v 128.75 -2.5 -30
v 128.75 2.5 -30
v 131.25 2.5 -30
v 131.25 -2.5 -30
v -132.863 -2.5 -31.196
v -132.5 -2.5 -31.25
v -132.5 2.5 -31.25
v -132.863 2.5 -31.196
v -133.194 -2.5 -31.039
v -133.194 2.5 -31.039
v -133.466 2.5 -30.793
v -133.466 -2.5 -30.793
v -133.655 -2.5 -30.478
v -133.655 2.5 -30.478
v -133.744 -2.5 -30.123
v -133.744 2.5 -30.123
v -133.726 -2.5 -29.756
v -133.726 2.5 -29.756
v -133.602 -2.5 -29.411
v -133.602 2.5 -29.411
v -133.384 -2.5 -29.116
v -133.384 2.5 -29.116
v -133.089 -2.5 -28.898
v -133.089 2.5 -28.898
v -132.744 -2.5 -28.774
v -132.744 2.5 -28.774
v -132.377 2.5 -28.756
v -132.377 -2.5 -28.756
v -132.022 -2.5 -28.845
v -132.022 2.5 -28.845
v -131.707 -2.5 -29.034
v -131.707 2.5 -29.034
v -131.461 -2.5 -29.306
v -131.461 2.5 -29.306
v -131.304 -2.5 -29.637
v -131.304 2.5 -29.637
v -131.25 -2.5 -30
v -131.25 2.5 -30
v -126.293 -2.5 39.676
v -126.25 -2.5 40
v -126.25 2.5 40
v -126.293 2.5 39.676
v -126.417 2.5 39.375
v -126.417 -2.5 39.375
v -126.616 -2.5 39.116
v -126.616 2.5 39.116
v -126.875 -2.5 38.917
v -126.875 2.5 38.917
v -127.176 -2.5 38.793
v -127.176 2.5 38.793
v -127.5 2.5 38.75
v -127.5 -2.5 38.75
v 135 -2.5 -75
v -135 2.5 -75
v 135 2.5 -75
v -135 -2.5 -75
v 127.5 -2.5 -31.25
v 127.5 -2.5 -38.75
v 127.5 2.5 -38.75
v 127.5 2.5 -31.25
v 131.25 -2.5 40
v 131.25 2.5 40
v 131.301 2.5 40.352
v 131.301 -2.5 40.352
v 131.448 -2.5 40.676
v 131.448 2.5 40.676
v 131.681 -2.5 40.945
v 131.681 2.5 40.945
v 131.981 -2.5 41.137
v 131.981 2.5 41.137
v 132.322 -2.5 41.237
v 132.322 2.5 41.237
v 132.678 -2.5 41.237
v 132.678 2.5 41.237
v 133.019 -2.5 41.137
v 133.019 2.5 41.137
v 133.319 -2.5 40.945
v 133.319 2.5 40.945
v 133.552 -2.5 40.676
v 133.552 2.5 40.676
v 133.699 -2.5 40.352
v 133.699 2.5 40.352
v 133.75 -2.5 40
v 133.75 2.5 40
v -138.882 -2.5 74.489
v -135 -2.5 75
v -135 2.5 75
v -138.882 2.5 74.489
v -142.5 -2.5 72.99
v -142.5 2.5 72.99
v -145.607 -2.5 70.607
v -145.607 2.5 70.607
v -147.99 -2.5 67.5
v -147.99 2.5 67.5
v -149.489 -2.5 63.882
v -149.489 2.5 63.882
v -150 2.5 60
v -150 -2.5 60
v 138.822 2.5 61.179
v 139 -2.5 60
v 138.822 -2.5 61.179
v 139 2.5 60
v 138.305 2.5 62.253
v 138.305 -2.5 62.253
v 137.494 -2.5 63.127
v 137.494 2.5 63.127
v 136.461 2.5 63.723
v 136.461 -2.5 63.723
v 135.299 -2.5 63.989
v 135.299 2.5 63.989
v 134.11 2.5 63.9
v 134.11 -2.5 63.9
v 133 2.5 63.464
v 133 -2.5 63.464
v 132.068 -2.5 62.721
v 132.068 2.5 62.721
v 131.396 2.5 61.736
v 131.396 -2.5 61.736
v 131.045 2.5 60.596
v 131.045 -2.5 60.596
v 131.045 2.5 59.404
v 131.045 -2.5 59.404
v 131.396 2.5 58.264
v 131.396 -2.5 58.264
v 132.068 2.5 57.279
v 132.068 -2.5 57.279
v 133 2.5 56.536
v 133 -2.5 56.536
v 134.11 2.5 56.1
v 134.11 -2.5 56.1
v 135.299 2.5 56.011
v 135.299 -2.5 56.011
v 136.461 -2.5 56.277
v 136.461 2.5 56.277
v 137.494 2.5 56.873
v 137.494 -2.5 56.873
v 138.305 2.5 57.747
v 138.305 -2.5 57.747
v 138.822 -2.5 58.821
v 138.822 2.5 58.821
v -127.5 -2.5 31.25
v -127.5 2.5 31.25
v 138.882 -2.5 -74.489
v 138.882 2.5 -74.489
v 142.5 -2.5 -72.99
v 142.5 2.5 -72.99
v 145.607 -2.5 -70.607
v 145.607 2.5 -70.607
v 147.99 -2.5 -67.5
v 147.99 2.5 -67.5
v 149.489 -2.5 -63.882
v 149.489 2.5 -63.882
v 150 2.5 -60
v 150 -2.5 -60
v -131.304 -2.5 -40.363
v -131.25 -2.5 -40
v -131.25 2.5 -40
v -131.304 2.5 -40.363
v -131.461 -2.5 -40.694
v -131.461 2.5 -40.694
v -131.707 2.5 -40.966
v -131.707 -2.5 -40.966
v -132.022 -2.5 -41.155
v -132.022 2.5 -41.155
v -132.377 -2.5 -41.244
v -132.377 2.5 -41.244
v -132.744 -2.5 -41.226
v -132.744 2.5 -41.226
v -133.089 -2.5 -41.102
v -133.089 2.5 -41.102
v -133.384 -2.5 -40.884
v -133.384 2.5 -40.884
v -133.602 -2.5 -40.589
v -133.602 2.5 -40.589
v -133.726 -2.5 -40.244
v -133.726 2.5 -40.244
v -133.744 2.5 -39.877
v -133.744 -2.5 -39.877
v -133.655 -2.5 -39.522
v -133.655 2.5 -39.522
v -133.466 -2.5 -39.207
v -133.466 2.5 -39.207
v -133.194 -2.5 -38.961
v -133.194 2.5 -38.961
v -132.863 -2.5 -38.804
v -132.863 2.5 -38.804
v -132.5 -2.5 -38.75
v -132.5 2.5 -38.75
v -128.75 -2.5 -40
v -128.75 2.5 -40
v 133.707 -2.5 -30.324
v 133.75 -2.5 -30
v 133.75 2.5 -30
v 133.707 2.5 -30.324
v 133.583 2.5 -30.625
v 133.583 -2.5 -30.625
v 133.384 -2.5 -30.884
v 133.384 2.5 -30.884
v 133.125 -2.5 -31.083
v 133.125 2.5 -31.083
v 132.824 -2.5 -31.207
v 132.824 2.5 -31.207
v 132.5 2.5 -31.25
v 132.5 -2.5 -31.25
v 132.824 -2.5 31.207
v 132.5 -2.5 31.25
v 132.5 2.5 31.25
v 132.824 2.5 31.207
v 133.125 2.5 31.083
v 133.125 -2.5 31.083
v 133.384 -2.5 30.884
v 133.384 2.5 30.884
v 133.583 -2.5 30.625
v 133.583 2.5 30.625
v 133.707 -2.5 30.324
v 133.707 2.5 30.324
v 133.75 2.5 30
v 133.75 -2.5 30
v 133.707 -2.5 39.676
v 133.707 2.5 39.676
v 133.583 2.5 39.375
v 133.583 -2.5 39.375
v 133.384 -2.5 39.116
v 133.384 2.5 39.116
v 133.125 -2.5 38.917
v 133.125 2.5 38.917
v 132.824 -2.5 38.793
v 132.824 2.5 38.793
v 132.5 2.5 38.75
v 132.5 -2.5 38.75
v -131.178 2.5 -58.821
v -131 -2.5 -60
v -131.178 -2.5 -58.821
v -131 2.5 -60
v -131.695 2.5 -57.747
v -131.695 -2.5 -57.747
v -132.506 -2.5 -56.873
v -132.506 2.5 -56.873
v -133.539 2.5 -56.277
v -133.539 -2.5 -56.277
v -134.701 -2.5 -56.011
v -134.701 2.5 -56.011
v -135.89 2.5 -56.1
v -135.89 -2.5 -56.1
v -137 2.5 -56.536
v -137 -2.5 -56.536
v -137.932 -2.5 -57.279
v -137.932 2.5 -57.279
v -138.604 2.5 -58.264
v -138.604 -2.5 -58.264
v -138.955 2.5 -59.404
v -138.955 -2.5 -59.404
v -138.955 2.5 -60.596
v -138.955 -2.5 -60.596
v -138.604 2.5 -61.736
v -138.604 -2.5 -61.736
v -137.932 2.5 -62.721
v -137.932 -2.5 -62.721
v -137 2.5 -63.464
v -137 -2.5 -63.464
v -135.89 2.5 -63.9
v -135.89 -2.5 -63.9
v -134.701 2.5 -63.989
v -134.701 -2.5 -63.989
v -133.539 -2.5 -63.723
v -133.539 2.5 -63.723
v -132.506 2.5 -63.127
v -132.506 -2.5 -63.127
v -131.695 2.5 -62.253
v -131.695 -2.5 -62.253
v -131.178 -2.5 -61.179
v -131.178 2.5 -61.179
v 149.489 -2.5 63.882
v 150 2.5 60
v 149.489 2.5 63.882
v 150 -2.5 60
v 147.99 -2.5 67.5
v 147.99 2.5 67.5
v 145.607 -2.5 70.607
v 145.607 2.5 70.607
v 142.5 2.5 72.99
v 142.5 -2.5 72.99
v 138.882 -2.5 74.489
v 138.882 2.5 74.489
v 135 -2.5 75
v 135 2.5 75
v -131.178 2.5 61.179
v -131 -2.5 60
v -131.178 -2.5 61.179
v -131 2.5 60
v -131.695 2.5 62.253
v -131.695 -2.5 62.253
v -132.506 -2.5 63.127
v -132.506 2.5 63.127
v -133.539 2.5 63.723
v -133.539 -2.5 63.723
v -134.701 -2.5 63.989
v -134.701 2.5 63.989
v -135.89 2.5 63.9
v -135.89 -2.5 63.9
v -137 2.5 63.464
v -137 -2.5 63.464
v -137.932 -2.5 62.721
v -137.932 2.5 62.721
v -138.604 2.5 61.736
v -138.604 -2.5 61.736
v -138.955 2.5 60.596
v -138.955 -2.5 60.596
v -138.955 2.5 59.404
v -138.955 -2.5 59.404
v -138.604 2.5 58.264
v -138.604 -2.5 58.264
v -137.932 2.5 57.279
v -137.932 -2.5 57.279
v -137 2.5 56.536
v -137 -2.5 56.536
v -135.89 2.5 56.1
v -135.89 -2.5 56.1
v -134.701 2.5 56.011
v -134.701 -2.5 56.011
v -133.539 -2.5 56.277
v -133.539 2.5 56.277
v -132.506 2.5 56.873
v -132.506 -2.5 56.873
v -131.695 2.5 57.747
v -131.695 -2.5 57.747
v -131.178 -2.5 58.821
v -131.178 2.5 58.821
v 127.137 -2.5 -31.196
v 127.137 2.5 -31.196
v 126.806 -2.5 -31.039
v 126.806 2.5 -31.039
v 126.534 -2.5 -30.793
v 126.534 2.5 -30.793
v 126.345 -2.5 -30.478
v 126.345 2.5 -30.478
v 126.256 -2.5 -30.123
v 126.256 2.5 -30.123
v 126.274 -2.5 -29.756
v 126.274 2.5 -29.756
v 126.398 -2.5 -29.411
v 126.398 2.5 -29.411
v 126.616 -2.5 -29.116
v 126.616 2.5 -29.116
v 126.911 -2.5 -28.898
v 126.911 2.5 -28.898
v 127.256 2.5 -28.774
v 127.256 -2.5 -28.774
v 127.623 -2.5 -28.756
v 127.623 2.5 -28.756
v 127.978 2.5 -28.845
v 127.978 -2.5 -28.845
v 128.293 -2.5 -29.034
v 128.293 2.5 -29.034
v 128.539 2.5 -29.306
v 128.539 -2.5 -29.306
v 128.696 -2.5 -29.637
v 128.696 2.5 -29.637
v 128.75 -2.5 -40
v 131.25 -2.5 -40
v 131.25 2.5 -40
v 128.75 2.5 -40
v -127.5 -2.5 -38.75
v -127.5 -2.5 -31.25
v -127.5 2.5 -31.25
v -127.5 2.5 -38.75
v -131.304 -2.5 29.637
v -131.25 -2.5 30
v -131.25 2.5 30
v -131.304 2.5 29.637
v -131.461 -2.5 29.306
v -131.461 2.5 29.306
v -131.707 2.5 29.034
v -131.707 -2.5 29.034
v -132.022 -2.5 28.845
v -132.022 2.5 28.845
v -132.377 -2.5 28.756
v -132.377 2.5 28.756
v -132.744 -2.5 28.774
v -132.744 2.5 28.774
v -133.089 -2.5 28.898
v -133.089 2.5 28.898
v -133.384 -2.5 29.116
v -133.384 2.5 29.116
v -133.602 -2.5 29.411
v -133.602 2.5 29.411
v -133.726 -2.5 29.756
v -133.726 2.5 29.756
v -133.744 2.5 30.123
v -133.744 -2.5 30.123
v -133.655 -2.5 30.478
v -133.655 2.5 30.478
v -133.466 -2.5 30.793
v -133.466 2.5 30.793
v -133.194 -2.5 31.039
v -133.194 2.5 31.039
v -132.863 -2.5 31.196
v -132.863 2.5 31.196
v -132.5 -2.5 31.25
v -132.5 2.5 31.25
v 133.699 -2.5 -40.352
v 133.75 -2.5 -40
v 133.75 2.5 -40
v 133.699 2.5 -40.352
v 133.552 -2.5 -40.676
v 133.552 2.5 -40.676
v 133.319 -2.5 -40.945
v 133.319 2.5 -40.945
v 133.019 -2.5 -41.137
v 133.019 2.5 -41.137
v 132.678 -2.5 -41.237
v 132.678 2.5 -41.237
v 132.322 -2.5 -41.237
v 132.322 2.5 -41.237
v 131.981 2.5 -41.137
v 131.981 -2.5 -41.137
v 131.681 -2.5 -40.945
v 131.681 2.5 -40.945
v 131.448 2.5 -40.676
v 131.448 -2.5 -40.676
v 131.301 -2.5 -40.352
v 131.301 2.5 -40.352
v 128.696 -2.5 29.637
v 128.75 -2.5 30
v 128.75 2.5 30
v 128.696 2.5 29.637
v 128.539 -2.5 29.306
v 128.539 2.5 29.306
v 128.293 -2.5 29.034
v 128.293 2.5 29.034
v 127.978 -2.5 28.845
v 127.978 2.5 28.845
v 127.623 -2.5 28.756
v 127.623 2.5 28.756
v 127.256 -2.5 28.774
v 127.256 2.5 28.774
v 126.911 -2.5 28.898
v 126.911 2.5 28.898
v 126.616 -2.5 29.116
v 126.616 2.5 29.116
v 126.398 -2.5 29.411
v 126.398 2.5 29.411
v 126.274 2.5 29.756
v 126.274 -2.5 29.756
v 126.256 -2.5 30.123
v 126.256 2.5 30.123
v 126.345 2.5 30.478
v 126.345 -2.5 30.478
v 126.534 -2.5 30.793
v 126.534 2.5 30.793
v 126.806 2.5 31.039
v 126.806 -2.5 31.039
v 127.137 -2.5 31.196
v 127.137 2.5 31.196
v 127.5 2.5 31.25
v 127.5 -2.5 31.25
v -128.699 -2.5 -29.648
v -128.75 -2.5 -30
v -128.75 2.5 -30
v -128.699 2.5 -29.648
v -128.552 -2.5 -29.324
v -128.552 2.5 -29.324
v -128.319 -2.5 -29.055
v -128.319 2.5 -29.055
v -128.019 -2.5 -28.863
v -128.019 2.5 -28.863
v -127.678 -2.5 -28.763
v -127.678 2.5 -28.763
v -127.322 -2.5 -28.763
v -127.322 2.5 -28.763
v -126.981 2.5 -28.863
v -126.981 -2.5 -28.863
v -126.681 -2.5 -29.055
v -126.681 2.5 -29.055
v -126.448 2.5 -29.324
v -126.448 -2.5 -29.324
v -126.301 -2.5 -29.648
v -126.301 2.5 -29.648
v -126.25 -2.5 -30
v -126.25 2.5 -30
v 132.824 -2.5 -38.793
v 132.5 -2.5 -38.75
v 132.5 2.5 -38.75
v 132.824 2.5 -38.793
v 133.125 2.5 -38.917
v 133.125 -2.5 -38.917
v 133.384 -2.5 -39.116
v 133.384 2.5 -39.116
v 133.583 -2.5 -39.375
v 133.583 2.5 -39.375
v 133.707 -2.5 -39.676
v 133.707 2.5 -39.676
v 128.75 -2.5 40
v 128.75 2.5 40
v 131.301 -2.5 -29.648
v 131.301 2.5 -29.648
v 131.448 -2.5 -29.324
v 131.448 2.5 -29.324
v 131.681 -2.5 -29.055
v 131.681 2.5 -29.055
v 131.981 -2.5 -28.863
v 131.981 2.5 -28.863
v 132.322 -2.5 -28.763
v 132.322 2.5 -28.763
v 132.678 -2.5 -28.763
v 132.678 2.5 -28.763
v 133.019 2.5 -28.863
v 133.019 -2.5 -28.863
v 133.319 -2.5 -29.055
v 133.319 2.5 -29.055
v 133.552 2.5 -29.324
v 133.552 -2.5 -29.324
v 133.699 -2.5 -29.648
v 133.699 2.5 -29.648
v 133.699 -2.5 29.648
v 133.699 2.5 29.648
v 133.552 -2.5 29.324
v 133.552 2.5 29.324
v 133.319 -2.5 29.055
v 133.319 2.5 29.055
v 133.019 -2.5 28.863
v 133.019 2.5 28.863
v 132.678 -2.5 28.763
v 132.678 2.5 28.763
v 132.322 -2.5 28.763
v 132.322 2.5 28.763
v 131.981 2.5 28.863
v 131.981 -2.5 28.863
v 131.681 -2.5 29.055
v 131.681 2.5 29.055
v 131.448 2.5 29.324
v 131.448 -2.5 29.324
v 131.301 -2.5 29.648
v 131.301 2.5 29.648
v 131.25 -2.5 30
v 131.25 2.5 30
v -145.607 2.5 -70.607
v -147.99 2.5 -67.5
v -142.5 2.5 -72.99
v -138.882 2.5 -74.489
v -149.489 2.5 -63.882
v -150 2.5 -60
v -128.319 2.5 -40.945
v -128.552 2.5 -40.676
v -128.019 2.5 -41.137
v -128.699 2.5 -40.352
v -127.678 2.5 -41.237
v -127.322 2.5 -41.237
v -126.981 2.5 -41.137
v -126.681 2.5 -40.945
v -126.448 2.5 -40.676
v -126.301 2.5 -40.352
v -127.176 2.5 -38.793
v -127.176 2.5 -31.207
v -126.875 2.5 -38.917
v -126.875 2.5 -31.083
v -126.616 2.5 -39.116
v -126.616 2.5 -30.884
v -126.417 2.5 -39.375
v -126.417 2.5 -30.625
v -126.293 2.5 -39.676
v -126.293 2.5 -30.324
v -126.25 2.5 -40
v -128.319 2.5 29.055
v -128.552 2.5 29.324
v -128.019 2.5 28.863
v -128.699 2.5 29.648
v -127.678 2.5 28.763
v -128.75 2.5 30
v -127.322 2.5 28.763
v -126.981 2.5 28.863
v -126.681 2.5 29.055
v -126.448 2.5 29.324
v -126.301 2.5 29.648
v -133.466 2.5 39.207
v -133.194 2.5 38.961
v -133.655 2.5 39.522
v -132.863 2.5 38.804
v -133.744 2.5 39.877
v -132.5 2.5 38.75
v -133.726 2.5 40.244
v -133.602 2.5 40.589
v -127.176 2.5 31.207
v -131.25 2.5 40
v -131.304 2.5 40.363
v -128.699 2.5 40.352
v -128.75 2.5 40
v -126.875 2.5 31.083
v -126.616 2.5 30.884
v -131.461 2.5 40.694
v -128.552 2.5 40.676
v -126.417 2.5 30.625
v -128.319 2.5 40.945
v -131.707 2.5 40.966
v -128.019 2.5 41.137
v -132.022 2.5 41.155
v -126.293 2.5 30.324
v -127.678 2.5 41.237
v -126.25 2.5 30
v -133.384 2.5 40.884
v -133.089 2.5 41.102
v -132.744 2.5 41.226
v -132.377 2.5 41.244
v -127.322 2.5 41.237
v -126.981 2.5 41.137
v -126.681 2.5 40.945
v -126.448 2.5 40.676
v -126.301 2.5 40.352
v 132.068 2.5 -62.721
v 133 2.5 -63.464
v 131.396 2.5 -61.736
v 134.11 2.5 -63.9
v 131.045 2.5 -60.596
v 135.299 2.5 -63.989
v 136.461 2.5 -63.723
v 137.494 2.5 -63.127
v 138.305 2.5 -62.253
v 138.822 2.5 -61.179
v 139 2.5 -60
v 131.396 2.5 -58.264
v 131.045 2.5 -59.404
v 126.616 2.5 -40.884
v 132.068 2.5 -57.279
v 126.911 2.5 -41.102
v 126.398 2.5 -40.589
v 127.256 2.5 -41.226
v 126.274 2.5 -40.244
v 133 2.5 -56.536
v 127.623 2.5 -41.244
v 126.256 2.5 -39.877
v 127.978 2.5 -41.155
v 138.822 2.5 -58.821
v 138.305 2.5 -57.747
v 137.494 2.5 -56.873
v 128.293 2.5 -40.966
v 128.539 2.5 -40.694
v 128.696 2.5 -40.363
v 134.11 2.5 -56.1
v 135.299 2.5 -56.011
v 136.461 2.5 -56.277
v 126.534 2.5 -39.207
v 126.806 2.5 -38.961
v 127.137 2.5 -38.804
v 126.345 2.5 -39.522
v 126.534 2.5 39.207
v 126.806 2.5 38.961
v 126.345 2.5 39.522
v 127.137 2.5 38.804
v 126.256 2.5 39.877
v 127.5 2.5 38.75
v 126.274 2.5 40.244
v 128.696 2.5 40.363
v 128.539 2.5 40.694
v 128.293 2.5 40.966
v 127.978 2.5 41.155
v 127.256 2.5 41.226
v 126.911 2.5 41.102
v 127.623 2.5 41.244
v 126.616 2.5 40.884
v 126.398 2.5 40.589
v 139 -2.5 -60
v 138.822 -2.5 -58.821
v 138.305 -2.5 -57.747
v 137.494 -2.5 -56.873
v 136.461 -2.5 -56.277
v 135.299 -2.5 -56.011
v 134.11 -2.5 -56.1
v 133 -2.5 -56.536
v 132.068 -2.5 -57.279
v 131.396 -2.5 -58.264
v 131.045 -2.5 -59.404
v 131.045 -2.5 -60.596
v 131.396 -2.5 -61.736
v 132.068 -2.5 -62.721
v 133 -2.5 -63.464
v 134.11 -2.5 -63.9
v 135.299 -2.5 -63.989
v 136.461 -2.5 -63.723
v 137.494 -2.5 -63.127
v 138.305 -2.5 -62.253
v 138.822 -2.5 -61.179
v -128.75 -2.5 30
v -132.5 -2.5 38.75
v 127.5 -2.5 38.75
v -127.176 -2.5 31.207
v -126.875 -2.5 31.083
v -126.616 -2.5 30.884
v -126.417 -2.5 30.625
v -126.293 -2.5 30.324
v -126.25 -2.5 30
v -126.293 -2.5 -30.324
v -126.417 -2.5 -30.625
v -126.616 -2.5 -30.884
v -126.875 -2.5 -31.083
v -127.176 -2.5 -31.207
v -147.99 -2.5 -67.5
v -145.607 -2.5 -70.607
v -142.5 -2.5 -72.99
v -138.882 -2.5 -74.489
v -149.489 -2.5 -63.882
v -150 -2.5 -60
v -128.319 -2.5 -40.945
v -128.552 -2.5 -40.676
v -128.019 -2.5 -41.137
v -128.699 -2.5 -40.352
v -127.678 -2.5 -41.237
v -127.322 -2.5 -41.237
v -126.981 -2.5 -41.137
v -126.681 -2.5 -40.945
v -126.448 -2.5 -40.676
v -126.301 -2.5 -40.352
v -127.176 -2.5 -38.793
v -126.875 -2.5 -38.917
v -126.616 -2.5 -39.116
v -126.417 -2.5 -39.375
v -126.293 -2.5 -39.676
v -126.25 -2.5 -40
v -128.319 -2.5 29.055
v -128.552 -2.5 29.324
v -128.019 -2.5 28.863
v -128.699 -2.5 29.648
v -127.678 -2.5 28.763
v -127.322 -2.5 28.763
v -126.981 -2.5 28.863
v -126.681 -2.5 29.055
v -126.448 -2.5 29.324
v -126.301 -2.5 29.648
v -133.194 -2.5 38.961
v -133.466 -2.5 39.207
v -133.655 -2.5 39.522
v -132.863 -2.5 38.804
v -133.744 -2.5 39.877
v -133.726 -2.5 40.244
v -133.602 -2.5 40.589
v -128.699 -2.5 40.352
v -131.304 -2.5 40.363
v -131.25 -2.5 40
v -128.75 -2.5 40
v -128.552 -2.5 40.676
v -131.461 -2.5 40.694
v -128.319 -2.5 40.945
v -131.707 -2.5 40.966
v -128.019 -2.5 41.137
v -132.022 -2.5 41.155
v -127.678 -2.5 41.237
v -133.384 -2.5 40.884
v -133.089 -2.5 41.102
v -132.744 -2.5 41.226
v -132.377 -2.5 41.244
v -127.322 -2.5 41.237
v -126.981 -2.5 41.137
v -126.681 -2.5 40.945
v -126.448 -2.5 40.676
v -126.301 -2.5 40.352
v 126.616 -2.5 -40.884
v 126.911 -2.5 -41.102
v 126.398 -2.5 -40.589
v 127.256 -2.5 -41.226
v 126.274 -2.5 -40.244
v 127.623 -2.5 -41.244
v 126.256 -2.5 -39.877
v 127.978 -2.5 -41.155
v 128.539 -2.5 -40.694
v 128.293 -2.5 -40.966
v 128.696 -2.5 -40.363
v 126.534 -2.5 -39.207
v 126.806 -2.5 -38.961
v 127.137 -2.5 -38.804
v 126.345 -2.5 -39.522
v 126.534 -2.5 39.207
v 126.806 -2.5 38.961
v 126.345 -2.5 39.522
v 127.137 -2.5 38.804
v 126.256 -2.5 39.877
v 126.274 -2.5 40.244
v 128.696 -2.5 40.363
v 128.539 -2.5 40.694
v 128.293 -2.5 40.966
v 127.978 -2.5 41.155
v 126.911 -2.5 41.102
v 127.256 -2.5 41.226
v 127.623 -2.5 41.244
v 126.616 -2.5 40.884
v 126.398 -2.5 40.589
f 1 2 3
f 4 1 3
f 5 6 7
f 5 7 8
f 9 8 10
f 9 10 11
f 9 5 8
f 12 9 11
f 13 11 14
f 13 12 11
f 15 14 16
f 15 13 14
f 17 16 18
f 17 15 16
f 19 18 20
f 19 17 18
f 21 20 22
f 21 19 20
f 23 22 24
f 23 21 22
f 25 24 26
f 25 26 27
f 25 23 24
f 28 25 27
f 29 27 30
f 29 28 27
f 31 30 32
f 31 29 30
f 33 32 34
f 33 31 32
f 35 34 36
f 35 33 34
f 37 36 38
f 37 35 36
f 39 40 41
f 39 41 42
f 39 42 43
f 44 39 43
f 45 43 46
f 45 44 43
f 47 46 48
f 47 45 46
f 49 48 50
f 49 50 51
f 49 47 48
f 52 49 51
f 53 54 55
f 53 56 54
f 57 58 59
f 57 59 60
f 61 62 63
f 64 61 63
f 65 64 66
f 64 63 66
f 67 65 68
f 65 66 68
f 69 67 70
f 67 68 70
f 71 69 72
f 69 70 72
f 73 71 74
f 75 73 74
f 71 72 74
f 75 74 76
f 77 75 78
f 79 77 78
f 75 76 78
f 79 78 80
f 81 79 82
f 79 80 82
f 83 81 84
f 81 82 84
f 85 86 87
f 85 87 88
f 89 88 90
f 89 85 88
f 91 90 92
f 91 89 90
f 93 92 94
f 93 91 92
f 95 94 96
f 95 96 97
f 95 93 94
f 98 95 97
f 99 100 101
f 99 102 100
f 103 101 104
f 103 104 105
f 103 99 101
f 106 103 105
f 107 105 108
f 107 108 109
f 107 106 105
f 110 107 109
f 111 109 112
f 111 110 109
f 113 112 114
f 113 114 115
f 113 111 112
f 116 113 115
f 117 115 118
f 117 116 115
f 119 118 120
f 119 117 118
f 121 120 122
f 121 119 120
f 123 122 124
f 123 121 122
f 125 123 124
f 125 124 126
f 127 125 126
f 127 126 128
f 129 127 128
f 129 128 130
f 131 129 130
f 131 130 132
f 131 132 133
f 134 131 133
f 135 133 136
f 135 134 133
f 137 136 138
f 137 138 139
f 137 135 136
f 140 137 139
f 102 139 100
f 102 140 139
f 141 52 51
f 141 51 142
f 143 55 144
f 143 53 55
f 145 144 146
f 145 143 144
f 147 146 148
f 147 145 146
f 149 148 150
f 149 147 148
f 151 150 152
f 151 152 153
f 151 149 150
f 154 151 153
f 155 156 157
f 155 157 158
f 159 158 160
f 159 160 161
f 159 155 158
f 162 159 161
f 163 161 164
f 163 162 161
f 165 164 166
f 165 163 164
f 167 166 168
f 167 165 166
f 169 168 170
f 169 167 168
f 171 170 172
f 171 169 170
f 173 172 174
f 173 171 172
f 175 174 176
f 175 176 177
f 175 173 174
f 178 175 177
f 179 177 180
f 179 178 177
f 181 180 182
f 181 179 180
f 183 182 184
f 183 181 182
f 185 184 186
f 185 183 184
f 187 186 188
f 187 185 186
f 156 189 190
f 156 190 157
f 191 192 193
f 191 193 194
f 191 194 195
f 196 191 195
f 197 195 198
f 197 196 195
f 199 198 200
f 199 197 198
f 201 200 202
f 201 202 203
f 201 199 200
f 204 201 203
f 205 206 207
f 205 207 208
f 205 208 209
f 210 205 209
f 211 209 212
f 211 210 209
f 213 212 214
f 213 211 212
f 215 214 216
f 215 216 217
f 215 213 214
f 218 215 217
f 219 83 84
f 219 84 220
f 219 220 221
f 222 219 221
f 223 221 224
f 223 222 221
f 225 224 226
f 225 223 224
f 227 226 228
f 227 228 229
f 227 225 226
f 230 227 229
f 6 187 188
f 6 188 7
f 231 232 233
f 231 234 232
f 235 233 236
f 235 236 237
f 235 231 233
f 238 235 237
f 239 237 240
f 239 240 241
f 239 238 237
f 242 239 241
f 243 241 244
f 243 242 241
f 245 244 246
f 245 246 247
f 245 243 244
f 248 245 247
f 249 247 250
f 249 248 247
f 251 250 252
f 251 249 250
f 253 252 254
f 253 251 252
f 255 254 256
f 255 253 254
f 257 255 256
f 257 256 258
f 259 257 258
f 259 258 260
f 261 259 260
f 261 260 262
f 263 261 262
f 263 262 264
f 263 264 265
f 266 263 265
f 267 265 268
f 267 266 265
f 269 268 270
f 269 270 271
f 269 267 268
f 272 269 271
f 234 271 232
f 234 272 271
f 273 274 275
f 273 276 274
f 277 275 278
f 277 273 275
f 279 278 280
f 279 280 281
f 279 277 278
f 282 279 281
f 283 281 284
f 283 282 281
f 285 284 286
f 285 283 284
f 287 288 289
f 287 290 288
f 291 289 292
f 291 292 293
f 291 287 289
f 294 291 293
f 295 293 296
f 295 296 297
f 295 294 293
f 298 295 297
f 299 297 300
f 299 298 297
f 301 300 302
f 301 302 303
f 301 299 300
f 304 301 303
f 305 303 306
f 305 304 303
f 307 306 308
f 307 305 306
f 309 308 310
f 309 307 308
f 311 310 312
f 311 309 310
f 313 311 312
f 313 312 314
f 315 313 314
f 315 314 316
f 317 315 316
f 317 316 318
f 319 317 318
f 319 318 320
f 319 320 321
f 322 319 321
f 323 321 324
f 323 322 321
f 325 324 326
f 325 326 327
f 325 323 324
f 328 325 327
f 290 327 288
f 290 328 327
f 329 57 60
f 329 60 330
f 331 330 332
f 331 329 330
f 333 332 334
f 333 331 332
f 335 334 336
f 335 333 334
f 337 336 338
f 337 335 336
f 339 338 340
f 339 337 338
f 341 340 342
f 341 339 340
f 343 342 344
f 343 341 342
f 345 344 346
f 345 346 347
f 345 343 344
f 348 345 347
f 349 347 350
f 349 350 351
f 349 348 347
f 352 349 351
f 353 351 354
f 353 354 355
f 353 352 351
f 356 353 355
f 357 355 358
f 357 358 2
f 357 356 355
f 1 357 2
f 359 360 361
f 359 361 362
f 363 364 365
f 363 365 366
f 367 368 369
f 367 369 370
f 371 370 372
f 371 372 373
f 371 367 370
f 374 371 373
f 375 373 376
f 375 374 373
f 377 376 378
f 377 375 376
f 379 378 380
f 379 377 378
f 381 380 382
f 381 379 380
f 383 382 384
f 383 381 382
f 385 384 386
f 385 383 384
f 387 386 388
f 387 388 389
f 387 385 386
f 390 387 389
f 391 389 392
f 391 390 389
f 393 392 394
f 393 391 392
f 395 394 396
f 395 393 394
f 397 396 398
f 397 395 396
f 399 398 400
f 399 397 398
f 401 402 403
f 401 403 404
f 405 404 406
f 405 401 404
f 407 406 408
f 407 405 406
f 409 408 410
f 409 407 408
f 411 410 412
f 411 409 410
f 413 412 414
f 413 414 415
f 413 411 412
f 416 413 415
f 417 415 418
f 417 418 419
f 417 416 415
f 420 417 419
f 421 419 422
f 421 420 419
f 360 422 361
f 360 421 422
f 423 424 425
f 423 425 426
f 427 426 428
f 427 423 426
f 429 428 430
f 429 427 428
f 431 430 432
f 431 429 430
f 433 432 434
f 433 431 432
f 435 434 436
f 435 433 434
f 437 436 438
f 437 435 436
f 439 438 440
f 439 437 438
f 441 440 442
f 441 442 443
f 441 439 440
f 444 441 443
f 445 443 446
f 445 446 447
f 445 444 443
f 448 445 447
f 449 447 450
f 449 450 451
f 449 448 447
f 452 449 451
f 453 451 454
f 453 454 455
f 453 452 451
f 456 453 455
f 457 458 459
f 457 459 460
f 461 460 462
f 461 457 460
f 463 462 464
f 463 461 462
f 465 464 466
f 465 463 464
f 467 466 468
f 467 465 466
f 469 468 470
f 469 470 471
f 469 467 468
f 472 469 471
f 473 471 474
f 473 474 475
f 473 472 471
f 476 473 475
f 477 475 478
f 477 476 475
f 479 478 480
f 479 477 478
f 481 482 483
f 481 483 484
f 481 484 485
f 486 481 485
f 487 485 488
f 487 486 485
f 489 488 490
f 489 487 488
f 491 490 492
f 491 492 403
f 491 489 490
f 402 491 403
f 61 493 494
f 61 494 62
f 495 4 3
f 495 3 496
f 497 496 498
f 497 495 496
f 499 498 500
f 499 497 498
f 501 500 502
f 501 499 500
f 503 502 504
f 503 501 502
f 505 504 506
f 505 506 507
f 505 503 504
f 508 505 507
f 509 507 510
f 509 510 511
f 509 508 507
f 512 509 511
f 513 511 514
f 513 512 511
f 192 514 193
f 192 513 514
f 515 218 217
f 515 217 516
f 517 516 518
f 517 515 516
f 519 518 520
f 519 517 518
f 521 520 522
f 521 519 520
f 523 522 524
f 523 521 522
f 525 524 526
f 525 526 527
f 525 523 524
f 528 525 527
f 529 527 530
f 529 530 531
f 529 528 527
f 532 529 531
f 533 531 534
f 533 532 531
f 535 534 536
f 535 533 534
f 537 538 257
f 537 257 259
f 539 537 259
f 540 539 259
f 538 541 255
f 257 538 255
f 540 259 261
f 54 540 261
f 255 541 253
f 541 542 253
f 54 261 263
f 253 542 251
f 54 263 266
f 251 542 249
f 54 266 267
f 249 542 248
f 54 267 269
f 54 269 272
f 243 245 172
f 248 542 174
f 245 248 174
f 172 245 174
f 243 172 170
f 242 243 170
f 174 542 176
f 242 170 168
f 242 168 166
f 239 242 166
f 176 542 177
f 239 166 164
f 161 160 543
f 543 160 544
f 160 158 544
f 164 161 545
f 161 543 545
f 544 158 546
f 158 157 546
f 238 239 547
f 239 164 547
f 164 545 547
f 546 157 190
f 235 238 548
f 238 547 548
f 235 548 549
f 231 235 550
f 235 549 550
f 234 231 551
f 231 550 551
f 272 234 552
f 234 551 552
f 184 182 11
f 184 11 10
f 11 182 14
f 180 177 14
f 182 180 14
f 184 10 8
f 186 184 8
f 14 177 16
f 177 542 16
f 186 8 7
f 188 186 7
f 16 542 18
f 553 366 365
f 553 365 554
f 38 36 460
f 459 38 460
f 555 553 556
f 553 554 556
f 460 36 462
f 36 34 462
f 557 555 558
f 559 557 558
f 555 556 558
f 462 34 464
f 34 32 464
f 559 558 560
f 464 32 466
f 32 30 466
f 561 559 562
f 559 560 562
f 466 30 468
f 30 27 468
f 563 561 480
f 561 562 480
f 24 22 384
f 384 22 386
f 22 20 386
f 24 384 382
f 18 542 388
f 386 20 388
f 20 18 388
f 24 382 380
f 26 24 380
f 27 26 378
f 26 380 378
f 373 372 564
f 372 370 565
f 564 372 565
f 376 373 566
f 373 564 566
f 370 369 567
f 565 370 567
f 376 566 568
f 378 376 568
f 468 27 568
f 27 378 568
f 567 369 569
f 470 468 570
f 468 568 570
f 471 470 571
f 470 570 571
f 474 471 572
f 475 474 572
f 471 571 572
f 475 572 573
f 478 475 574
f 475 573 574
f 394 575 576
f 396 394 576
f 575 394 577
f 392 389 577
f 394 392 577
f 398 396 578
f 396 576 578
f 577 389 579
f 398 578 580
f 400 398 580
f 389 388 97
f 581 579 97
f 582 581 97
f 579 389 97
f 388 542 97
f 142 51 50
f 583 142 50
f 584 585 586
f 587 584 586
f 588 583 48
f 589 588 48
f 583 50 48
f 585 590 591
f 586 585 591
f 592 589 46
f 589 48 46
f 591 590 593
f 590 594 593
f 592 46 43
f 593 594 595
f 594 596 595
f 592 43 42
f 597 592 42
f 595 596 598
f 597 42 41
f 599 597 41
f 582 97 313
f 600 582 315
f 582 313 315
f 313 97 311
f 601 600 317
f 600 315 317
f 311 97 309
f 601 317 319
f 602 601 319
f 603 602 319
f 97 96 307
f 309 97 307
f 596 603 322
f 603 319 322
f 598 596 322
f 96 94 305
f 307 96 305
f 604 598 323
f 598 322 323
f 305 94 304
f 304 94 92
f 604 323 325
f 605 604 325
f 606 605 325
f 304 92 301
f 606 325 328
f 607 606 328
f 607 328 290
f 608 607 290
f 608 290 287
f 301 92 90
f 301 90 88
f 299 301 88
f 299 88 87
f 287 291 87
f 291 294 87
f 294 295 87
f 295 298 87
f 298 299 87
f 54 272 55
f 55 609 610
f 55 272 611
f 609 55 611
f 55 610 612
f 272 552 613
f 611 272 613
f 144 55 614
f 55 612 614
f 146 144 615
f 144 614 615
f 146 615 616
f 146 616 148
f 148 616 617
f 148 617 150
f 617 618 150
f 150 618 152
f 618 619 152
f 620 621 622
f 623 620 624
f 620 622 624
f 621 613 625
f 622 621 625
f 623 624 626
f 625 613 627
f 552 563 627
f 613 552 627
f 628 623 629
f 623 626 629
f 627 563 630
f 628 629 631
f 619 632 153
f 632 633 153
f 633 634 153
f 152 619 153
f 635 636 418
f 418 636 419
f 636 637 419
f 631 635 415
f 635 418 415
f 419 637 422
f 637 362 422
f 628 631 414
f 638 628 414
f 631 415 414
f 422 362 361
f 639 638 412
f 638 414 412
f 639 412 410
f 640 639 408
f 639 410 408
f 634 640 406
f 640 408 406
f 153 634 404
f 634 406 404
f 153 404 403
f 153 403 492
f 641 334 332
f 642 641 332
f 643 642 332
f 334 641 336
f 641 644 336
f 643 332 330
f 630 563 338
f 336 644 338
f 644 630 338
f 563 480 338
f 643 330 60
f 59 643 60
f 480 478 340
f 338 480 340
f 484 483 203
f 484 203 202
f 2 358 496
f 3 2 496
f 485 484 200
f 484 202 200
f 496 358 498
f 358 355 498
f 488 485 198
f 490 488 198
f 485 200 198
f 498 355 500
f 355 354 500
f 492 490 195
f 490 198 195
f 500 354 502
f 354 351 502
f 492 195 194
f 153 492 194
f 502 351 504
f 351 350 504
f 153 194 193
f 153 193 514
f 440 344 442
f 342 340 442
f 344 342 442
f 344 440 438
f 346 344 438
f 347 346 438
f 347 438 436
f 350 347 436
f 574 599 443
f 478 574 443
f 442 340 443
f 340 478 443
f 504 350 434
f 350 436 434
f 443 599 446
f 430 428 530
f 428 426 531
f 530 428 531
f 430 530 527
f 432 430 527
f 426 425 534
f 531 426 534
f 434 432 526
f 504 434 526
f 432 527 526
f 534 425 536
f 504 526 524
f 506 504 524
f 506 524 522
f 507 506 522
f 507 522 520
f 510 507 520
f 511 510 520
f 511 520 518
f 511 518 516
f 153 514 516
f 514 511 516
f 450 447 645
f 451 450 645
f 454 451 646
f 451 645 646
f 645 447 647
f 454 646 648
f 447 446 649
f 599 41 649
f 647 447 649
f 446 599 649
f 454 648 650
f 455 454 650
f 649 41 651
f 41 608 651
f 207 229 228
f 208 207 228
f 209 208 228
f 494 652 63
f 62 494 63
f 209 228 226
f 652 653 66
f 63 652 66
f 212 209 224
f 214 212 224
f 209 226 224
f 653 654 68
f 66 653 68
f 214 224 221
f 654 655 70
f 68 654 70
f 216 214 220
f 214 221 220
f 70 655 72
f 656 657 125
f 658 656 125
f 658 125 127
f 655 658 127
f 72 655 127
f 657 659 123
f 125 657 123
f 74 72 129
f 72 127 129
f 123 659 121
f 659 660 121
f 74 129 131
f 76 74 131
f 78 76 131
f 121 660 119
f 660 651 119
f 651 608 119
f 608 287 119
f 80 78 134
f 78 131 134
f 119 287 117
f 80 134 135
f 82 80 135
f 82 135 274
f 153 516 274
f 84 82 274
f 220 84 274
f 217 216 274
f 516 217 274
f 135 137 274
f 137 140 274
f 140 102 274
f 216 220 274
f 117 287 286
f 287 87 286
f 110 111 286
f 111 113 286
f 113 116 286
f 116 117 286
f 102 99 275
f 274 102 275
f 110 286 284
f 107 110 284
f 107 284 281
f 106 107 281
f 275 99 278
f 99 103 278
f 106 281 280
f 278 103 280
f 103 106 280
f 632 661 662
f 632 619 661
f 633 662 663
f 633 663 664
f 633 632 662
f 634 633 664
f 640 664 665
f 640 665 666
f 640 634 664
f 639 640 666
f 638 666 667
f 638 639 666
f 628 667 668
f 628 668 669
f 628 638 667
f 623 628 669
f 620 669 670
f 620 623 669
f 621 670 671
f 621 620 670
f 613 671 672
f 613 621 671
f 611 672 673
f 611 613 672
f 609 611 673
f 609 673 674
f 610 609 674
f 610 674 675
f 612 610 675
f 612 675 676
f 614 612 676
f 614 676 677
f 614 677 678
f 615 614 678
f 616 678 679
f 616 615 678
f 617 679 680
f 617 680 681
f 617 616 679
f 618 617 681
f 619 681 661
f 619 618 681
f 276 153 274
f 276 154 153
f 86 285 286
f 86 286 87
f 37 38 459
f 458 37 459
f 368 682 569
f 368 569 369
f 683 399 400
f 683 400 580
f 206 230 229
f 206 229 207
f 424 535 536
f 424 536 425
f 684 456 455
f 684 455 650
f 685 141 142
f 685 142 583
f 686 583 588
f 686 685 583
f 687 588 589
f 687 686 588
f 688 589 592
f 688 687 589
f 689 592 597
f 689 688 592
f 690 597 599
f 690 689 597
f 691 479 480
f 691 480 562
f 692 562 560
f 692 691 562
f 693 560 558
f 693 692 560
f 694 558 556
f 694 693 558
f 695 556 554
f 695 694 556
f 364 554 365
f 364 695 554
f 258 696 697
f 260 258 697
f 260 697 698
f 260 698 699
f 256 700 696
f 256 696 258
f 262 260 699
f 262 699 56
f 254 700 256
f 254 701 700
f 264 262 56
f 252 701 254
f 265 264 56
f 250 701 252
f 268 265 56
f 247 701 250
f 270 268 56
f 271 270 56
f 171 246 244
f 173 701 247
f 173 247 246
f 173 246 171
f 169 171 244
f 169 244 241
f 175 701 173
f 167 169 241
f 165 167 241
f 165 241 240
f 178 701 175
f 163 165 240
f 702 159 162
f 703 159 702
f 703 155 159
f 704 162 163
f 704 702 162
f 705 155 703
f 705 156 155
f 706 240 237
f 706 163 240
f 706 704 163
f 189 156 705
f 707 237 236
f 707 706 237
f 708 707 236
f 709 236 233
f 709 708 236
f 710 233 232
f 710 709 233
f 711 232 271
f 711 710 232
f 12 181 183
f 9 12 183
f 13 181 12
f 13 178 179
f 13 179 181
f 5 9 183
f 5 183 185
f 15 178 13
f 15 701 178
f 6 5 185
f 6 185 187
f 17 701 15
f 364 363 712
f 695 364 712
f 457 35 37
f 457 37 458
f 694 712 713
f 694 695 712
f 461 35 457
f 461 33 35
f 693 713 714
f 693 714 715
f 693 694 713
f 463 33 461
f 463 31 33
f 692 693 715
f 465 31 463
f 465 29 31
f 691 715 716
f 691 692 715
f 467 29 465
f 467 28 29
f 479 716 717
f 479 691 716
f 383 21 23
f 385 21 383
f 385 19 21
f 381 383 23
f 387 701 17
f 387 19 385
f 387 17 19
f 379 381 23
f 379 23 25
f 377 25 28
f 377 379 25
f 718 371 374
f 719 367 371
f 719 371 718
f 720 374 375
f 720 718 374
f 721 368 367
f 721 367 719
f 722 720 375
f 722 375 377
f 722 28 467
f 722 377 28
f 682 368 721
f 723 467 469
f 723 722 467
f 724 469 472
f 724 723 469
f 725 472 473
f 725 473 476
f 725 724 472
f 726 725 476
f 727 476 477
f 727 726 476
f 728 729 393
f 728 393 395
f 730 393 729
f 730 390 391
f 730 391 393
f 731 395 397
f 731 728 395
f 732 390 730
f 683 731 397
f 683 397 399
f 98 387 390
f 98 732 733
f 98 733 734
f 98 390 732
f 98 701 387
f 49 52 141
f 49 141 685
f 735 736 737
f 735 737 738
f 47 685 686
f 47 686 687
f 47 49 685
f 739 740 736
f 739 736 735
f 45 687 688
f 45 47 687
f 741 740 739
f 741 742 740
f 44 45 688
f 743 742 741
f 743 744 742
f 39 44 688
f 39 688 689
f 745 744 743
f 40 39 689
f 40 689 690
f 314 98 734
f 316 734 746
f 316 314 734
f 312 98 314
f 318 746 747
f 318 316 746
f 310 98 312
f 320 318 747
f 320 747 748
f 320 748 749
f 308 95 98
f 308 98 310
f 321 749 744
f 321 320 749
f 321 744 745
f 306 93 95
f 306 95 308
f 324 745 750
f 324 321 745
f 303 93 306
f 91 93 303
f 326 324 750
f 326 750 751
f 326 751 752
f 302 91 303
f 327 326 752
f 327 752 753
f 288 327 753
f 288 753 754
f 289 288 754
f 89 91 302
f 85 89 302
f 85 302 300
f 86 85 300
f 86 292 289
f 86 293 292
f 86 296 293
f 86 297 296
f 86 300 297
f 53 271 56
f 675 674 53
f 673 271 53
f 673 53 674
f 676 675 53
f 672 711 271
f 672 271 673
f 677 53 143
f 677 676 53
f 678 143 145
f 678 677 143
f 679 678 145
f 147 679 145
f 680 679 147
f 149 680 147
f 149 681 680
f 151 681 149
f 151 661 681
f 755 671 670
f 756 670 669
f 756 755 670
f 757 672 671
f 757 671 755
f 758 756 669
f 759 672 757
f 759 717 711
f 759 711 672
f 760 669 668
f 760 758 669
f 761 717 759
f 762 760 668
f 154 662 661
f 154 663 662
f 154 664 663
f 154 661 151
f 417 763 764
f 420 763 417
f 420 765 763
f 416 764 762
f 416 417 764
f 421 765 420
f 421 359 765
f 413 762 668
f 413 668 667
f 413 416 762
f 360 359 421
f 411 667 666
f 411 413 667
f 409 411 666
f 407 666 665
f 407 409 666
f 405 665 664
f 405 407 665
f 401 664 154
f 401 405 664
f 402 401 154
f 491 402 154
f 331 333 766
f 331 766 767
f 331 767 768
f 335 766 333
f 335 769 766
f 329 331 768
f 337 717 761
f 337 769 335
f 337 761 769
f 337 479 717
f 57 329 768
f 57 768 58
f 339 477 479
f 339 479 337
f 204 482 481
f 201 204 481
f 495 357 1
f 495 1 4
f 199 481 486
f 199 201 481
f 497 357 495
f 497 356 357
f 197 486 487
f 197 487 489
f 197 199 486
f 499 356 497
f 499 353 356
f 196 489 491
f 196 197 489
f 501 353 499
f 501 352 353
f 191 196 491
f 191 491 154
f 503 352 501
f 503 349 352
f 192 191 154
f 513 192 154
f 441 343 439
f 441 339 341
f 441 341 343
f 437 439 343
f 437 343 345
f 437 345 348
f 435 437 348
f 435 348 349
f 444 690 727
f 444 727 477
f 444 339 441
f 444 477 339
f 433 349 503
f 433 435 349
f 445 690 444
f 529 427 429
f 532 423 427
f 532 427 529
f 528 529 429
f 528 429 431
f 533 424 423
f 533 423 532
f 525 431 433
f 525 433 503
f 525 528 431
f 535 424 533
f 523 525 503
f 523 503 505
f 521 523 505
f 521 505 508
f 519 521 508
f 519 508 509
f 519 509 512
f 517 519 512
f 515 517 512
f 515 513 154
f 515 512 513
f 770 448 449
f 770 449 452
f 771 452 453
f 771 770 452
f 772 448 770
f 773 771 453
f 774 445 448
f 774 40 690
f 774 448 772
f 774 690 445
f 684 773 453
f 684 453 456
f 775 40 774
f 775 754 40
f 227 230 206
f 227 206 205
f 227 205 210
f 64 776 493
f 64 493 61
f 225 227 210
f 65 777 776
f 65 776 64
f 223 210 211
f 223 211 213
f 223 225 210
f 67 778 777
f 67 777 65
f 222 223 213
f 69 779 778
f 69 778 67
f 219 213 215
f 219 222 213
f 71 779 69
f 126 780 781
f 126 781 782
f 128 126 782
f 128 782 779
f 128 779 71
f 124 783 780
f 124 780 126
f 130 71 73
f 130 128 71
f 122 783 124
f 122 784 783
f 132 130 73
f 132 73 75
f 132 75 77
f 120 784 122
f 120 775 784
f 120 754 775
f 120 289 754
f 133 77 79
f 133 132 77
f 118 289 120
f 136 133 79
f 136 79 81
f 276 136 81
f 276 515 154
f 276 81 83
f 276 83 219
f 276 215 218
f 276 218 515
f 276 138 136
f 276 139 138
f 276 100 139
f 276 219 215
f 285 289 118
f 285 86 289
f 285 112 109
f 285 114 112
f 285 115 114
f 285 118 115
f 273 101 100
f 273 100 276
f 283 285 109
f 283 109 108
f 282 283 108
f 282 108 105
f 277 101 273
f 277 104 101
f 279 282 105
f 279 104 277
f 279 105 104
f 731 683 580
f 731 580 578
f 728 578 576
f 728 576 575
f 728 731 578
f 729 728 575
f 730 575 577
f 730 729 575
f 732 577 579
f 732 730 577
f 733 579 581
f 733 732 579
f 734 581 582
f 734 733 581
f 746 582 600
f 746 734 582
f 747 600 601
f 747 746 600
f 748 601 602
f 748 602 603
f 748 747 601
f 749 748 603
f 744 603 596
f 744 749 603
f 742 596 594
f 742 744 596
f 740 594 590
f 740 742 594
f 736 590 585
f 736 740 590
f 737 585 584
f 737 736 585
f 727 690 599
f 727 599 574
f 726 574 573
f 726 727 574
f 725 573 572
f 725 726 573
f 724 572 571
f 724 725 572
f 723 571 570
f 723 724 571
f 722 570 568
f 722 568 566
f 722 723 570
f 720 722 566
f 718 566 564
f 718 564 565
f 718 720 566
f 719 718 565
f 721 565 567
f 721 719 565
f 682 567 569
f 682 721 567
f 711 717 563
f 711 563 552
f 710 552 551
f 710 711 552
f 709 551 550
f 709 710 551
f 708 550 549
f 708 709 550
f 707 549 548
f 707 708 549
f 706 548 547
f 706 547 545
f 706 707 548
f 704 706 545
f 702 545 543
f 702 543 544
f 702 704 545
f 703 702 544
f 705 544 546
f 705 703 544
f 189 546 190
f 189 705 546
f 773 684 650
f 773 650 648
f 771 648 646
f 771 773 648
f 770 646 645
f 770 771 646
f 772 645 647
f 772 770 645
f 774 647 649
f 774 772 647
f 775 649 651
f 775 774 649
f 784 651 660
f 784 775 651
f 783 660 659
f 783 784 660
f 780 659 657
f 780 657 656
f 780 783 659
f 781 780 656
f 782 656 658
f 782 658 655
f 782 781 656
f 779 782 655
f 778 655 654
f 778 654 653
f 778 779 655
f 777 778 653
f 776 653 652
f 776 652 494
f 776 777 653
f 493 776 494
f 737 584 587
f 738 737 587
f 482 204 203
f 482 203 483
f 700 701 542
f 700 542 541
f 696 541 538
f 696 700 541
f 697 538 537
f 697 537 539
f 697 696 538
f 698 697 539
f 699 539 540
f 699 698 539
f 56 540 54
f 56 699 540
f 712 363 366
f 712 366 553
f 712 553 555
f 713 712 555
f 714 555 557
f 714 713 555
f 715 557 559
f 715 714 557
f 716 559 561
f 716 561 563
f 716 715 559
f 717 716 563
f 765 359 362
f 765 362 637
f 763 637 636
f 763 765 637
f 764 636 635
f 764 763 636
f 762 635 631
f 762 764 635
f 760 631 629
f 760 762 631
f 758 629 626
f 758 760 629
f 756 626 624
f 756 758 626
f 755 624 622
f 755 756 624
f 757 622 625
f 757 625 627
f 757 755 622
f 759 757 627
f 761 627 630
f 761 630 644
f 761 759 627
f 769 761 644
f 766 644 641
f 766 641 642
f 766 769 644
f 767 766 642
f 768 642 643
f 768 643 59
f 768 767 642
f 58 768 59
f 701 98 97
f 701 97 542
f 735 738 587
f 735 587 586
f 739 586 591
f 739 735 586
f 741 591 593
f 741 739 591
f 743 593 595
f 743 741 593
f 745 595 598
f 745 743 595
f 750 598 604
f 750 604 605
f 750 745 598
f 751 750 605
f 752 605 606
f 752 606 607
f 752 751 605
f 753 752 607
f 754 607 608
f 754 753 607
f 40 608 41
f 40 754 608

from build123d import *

# Parameters (mm, degrees)
F0_R     = 4
F1_DEPTH = 2.5


with BuildPart() as f1:
    # F0 (on Front) → F1 (new body, symmetric)
    with BuildSketch(Plane.XZ):
        with BuildLine():
            ThreePointArc((150, 60), (145.606602, 70.606602), (135, 75))
            Line((135, 75), (-135, 75))
            ThreePointArc((-135, 75), (-145.606602, 70.606602), (-150, 60))
            Line((-150, 60), (-150, -60))
            ThreePointArc((-150, -60), (-145.606602, -70.606602), (-135, -75))
            Line((-135, -75), (135, -75))
            ThreePointArc((135, -75), (145.606602, -70.606602), (150, -60))
            Line((150, -60), (150, 60))
        make_face()
        with Locations((-135, -60)):
            Circle(F0_R, mode=Mode.SUBTRACT)
        with BuildLine():
            Line((-128.75, -40), (-131.25, -40))
            ThreePointArc((-131.25, -40), (-133.383883, -40.883883), (-132.5, -38.75))
            Line((-132.5, -38.75), (-132.5, -31.25))
            ThreePointArc((-132.5, -31.25), (-133.383883, -29.116117), (-131.25, -30))
            Line((-131.25, -30), (-128.75, -30))
            ThreePointArc((-128.75, -30), (-127.5, -28.75), (-126.25, -30))
            ThreePointArc((-126.25, -30), (-126.616117, -30.883883), (-127.5, -31.25))
            Line((-127.5, -31.25), (-127.5, -38.75))
            ThreePointArc((-127.5, -38.75), (-126.616117, -39.116117), (-126.25, -40))
            ThreePointArc((-126.25, -40), (-127.5, -41.25), (-128.75, -40))
        make_face(mode=Mode.SUBTRACT)
        with Locations((135, -60)):
            Circle(F0_R, mode=Mode.SUBTRACT)
        with BuildLine():
            Line((131.25, -40), (128.75, -40))
            ThreePointArc((128.75, -40), (126.616117, -40.883883), (127.5, -38.75))
            Line((127.5, -38.75), (127.5, -31.25))
            ThreePointArc((127.5, -31.25), (126.616117, -29.116117), (128.75, -30))
            Line((128.75, -30), (131.25, -30))
            ThreePointArc((131.25, -30), (132.5, -28.75), (133.75, -30))
            ThreePointArc((133.75, -30), (133.383883, -30.883883), (132.5, -31.25))
            Line((132.5, -31.25), (132.5, -38.75))
            ThreePointArc((132.5, -38.75), (133.383883, -39.116117), (133.75, -40))
            ThreePointArc((133.75, -40), (132.5, -41.25), (131.25, -40))
        make_face(mode=Mode.SUBTRACT)
        with BuildLine():
            Line((-128.75, 30), (-131.25, 30))
            ThreePointArc((-131.25, 30), (-133.383883, 29.116117), (-132.5, 31.25))
            Line((-132.5, 31.25), (-132.5, 38.75))
            ThreePointArc((-132.5, 38.75), (-133.383883, 40.883883), (-131.25, 40))
            Line((-131.25, 40), (-128.75, 40))
            ThreePointArc((-128.75, 40), (-127.5, 41.25), (-126.25, 40))
            ThreePointArc((-126.25, 40), (-126.616117, 39.116117), (-127.5, 38.75))
            Line((-127.5, 38.75), (-127.5, 31.25))
            ThreePointArc((-127.5, 31.25), (-126.616117, 30.883883), (-126.25, 30))
            ThreePointArc((-126.25, 30), (-127.5, 28.75), (-128.75, 30))
        make_face(mode=Mode.SUBTRACT)
        with Locations((-135, 60)):
            Circle(F0_R, mode=Mode.SUBTRACT)
        with BuildLine():
            ThreePointArc((128.75, 30), (126.616117, 29.116117), (127.5, 31.25))
            Line((127.5, 31.25), (127.5, 38.75))
            ThreePointArc((127.5, 38.75), (126.616117, 40.883883), (128.75, 40))
            Line((128.75, 40), (131.25, 40))
            ThreePointArc((131.25, 40), (132.5, 41.25), (133.75, 40))
            ThreePointArc((133.75, 40), (133.383883, 39.116117), (132.5, 38.75))
            Line((132.5, 38.75), (132.5, 31.25))
            ThreePointArc((132.5, 31.25), (133.383883, 30.883883), (133.75, 30))
            ThreePointArc((133.75, 30), (132.5, 28.75), (131.25, 30))
            Line((131.25, 30), (128.75, 30))
        make_face(mode=Mode.SUBTRACT)
        with Locations((135, 60)):
            Circle(F0_R, mode=Mode.SUBTRACT)
    extrude(amount=F1_DEPTH, both=True)


solid = f1.part
